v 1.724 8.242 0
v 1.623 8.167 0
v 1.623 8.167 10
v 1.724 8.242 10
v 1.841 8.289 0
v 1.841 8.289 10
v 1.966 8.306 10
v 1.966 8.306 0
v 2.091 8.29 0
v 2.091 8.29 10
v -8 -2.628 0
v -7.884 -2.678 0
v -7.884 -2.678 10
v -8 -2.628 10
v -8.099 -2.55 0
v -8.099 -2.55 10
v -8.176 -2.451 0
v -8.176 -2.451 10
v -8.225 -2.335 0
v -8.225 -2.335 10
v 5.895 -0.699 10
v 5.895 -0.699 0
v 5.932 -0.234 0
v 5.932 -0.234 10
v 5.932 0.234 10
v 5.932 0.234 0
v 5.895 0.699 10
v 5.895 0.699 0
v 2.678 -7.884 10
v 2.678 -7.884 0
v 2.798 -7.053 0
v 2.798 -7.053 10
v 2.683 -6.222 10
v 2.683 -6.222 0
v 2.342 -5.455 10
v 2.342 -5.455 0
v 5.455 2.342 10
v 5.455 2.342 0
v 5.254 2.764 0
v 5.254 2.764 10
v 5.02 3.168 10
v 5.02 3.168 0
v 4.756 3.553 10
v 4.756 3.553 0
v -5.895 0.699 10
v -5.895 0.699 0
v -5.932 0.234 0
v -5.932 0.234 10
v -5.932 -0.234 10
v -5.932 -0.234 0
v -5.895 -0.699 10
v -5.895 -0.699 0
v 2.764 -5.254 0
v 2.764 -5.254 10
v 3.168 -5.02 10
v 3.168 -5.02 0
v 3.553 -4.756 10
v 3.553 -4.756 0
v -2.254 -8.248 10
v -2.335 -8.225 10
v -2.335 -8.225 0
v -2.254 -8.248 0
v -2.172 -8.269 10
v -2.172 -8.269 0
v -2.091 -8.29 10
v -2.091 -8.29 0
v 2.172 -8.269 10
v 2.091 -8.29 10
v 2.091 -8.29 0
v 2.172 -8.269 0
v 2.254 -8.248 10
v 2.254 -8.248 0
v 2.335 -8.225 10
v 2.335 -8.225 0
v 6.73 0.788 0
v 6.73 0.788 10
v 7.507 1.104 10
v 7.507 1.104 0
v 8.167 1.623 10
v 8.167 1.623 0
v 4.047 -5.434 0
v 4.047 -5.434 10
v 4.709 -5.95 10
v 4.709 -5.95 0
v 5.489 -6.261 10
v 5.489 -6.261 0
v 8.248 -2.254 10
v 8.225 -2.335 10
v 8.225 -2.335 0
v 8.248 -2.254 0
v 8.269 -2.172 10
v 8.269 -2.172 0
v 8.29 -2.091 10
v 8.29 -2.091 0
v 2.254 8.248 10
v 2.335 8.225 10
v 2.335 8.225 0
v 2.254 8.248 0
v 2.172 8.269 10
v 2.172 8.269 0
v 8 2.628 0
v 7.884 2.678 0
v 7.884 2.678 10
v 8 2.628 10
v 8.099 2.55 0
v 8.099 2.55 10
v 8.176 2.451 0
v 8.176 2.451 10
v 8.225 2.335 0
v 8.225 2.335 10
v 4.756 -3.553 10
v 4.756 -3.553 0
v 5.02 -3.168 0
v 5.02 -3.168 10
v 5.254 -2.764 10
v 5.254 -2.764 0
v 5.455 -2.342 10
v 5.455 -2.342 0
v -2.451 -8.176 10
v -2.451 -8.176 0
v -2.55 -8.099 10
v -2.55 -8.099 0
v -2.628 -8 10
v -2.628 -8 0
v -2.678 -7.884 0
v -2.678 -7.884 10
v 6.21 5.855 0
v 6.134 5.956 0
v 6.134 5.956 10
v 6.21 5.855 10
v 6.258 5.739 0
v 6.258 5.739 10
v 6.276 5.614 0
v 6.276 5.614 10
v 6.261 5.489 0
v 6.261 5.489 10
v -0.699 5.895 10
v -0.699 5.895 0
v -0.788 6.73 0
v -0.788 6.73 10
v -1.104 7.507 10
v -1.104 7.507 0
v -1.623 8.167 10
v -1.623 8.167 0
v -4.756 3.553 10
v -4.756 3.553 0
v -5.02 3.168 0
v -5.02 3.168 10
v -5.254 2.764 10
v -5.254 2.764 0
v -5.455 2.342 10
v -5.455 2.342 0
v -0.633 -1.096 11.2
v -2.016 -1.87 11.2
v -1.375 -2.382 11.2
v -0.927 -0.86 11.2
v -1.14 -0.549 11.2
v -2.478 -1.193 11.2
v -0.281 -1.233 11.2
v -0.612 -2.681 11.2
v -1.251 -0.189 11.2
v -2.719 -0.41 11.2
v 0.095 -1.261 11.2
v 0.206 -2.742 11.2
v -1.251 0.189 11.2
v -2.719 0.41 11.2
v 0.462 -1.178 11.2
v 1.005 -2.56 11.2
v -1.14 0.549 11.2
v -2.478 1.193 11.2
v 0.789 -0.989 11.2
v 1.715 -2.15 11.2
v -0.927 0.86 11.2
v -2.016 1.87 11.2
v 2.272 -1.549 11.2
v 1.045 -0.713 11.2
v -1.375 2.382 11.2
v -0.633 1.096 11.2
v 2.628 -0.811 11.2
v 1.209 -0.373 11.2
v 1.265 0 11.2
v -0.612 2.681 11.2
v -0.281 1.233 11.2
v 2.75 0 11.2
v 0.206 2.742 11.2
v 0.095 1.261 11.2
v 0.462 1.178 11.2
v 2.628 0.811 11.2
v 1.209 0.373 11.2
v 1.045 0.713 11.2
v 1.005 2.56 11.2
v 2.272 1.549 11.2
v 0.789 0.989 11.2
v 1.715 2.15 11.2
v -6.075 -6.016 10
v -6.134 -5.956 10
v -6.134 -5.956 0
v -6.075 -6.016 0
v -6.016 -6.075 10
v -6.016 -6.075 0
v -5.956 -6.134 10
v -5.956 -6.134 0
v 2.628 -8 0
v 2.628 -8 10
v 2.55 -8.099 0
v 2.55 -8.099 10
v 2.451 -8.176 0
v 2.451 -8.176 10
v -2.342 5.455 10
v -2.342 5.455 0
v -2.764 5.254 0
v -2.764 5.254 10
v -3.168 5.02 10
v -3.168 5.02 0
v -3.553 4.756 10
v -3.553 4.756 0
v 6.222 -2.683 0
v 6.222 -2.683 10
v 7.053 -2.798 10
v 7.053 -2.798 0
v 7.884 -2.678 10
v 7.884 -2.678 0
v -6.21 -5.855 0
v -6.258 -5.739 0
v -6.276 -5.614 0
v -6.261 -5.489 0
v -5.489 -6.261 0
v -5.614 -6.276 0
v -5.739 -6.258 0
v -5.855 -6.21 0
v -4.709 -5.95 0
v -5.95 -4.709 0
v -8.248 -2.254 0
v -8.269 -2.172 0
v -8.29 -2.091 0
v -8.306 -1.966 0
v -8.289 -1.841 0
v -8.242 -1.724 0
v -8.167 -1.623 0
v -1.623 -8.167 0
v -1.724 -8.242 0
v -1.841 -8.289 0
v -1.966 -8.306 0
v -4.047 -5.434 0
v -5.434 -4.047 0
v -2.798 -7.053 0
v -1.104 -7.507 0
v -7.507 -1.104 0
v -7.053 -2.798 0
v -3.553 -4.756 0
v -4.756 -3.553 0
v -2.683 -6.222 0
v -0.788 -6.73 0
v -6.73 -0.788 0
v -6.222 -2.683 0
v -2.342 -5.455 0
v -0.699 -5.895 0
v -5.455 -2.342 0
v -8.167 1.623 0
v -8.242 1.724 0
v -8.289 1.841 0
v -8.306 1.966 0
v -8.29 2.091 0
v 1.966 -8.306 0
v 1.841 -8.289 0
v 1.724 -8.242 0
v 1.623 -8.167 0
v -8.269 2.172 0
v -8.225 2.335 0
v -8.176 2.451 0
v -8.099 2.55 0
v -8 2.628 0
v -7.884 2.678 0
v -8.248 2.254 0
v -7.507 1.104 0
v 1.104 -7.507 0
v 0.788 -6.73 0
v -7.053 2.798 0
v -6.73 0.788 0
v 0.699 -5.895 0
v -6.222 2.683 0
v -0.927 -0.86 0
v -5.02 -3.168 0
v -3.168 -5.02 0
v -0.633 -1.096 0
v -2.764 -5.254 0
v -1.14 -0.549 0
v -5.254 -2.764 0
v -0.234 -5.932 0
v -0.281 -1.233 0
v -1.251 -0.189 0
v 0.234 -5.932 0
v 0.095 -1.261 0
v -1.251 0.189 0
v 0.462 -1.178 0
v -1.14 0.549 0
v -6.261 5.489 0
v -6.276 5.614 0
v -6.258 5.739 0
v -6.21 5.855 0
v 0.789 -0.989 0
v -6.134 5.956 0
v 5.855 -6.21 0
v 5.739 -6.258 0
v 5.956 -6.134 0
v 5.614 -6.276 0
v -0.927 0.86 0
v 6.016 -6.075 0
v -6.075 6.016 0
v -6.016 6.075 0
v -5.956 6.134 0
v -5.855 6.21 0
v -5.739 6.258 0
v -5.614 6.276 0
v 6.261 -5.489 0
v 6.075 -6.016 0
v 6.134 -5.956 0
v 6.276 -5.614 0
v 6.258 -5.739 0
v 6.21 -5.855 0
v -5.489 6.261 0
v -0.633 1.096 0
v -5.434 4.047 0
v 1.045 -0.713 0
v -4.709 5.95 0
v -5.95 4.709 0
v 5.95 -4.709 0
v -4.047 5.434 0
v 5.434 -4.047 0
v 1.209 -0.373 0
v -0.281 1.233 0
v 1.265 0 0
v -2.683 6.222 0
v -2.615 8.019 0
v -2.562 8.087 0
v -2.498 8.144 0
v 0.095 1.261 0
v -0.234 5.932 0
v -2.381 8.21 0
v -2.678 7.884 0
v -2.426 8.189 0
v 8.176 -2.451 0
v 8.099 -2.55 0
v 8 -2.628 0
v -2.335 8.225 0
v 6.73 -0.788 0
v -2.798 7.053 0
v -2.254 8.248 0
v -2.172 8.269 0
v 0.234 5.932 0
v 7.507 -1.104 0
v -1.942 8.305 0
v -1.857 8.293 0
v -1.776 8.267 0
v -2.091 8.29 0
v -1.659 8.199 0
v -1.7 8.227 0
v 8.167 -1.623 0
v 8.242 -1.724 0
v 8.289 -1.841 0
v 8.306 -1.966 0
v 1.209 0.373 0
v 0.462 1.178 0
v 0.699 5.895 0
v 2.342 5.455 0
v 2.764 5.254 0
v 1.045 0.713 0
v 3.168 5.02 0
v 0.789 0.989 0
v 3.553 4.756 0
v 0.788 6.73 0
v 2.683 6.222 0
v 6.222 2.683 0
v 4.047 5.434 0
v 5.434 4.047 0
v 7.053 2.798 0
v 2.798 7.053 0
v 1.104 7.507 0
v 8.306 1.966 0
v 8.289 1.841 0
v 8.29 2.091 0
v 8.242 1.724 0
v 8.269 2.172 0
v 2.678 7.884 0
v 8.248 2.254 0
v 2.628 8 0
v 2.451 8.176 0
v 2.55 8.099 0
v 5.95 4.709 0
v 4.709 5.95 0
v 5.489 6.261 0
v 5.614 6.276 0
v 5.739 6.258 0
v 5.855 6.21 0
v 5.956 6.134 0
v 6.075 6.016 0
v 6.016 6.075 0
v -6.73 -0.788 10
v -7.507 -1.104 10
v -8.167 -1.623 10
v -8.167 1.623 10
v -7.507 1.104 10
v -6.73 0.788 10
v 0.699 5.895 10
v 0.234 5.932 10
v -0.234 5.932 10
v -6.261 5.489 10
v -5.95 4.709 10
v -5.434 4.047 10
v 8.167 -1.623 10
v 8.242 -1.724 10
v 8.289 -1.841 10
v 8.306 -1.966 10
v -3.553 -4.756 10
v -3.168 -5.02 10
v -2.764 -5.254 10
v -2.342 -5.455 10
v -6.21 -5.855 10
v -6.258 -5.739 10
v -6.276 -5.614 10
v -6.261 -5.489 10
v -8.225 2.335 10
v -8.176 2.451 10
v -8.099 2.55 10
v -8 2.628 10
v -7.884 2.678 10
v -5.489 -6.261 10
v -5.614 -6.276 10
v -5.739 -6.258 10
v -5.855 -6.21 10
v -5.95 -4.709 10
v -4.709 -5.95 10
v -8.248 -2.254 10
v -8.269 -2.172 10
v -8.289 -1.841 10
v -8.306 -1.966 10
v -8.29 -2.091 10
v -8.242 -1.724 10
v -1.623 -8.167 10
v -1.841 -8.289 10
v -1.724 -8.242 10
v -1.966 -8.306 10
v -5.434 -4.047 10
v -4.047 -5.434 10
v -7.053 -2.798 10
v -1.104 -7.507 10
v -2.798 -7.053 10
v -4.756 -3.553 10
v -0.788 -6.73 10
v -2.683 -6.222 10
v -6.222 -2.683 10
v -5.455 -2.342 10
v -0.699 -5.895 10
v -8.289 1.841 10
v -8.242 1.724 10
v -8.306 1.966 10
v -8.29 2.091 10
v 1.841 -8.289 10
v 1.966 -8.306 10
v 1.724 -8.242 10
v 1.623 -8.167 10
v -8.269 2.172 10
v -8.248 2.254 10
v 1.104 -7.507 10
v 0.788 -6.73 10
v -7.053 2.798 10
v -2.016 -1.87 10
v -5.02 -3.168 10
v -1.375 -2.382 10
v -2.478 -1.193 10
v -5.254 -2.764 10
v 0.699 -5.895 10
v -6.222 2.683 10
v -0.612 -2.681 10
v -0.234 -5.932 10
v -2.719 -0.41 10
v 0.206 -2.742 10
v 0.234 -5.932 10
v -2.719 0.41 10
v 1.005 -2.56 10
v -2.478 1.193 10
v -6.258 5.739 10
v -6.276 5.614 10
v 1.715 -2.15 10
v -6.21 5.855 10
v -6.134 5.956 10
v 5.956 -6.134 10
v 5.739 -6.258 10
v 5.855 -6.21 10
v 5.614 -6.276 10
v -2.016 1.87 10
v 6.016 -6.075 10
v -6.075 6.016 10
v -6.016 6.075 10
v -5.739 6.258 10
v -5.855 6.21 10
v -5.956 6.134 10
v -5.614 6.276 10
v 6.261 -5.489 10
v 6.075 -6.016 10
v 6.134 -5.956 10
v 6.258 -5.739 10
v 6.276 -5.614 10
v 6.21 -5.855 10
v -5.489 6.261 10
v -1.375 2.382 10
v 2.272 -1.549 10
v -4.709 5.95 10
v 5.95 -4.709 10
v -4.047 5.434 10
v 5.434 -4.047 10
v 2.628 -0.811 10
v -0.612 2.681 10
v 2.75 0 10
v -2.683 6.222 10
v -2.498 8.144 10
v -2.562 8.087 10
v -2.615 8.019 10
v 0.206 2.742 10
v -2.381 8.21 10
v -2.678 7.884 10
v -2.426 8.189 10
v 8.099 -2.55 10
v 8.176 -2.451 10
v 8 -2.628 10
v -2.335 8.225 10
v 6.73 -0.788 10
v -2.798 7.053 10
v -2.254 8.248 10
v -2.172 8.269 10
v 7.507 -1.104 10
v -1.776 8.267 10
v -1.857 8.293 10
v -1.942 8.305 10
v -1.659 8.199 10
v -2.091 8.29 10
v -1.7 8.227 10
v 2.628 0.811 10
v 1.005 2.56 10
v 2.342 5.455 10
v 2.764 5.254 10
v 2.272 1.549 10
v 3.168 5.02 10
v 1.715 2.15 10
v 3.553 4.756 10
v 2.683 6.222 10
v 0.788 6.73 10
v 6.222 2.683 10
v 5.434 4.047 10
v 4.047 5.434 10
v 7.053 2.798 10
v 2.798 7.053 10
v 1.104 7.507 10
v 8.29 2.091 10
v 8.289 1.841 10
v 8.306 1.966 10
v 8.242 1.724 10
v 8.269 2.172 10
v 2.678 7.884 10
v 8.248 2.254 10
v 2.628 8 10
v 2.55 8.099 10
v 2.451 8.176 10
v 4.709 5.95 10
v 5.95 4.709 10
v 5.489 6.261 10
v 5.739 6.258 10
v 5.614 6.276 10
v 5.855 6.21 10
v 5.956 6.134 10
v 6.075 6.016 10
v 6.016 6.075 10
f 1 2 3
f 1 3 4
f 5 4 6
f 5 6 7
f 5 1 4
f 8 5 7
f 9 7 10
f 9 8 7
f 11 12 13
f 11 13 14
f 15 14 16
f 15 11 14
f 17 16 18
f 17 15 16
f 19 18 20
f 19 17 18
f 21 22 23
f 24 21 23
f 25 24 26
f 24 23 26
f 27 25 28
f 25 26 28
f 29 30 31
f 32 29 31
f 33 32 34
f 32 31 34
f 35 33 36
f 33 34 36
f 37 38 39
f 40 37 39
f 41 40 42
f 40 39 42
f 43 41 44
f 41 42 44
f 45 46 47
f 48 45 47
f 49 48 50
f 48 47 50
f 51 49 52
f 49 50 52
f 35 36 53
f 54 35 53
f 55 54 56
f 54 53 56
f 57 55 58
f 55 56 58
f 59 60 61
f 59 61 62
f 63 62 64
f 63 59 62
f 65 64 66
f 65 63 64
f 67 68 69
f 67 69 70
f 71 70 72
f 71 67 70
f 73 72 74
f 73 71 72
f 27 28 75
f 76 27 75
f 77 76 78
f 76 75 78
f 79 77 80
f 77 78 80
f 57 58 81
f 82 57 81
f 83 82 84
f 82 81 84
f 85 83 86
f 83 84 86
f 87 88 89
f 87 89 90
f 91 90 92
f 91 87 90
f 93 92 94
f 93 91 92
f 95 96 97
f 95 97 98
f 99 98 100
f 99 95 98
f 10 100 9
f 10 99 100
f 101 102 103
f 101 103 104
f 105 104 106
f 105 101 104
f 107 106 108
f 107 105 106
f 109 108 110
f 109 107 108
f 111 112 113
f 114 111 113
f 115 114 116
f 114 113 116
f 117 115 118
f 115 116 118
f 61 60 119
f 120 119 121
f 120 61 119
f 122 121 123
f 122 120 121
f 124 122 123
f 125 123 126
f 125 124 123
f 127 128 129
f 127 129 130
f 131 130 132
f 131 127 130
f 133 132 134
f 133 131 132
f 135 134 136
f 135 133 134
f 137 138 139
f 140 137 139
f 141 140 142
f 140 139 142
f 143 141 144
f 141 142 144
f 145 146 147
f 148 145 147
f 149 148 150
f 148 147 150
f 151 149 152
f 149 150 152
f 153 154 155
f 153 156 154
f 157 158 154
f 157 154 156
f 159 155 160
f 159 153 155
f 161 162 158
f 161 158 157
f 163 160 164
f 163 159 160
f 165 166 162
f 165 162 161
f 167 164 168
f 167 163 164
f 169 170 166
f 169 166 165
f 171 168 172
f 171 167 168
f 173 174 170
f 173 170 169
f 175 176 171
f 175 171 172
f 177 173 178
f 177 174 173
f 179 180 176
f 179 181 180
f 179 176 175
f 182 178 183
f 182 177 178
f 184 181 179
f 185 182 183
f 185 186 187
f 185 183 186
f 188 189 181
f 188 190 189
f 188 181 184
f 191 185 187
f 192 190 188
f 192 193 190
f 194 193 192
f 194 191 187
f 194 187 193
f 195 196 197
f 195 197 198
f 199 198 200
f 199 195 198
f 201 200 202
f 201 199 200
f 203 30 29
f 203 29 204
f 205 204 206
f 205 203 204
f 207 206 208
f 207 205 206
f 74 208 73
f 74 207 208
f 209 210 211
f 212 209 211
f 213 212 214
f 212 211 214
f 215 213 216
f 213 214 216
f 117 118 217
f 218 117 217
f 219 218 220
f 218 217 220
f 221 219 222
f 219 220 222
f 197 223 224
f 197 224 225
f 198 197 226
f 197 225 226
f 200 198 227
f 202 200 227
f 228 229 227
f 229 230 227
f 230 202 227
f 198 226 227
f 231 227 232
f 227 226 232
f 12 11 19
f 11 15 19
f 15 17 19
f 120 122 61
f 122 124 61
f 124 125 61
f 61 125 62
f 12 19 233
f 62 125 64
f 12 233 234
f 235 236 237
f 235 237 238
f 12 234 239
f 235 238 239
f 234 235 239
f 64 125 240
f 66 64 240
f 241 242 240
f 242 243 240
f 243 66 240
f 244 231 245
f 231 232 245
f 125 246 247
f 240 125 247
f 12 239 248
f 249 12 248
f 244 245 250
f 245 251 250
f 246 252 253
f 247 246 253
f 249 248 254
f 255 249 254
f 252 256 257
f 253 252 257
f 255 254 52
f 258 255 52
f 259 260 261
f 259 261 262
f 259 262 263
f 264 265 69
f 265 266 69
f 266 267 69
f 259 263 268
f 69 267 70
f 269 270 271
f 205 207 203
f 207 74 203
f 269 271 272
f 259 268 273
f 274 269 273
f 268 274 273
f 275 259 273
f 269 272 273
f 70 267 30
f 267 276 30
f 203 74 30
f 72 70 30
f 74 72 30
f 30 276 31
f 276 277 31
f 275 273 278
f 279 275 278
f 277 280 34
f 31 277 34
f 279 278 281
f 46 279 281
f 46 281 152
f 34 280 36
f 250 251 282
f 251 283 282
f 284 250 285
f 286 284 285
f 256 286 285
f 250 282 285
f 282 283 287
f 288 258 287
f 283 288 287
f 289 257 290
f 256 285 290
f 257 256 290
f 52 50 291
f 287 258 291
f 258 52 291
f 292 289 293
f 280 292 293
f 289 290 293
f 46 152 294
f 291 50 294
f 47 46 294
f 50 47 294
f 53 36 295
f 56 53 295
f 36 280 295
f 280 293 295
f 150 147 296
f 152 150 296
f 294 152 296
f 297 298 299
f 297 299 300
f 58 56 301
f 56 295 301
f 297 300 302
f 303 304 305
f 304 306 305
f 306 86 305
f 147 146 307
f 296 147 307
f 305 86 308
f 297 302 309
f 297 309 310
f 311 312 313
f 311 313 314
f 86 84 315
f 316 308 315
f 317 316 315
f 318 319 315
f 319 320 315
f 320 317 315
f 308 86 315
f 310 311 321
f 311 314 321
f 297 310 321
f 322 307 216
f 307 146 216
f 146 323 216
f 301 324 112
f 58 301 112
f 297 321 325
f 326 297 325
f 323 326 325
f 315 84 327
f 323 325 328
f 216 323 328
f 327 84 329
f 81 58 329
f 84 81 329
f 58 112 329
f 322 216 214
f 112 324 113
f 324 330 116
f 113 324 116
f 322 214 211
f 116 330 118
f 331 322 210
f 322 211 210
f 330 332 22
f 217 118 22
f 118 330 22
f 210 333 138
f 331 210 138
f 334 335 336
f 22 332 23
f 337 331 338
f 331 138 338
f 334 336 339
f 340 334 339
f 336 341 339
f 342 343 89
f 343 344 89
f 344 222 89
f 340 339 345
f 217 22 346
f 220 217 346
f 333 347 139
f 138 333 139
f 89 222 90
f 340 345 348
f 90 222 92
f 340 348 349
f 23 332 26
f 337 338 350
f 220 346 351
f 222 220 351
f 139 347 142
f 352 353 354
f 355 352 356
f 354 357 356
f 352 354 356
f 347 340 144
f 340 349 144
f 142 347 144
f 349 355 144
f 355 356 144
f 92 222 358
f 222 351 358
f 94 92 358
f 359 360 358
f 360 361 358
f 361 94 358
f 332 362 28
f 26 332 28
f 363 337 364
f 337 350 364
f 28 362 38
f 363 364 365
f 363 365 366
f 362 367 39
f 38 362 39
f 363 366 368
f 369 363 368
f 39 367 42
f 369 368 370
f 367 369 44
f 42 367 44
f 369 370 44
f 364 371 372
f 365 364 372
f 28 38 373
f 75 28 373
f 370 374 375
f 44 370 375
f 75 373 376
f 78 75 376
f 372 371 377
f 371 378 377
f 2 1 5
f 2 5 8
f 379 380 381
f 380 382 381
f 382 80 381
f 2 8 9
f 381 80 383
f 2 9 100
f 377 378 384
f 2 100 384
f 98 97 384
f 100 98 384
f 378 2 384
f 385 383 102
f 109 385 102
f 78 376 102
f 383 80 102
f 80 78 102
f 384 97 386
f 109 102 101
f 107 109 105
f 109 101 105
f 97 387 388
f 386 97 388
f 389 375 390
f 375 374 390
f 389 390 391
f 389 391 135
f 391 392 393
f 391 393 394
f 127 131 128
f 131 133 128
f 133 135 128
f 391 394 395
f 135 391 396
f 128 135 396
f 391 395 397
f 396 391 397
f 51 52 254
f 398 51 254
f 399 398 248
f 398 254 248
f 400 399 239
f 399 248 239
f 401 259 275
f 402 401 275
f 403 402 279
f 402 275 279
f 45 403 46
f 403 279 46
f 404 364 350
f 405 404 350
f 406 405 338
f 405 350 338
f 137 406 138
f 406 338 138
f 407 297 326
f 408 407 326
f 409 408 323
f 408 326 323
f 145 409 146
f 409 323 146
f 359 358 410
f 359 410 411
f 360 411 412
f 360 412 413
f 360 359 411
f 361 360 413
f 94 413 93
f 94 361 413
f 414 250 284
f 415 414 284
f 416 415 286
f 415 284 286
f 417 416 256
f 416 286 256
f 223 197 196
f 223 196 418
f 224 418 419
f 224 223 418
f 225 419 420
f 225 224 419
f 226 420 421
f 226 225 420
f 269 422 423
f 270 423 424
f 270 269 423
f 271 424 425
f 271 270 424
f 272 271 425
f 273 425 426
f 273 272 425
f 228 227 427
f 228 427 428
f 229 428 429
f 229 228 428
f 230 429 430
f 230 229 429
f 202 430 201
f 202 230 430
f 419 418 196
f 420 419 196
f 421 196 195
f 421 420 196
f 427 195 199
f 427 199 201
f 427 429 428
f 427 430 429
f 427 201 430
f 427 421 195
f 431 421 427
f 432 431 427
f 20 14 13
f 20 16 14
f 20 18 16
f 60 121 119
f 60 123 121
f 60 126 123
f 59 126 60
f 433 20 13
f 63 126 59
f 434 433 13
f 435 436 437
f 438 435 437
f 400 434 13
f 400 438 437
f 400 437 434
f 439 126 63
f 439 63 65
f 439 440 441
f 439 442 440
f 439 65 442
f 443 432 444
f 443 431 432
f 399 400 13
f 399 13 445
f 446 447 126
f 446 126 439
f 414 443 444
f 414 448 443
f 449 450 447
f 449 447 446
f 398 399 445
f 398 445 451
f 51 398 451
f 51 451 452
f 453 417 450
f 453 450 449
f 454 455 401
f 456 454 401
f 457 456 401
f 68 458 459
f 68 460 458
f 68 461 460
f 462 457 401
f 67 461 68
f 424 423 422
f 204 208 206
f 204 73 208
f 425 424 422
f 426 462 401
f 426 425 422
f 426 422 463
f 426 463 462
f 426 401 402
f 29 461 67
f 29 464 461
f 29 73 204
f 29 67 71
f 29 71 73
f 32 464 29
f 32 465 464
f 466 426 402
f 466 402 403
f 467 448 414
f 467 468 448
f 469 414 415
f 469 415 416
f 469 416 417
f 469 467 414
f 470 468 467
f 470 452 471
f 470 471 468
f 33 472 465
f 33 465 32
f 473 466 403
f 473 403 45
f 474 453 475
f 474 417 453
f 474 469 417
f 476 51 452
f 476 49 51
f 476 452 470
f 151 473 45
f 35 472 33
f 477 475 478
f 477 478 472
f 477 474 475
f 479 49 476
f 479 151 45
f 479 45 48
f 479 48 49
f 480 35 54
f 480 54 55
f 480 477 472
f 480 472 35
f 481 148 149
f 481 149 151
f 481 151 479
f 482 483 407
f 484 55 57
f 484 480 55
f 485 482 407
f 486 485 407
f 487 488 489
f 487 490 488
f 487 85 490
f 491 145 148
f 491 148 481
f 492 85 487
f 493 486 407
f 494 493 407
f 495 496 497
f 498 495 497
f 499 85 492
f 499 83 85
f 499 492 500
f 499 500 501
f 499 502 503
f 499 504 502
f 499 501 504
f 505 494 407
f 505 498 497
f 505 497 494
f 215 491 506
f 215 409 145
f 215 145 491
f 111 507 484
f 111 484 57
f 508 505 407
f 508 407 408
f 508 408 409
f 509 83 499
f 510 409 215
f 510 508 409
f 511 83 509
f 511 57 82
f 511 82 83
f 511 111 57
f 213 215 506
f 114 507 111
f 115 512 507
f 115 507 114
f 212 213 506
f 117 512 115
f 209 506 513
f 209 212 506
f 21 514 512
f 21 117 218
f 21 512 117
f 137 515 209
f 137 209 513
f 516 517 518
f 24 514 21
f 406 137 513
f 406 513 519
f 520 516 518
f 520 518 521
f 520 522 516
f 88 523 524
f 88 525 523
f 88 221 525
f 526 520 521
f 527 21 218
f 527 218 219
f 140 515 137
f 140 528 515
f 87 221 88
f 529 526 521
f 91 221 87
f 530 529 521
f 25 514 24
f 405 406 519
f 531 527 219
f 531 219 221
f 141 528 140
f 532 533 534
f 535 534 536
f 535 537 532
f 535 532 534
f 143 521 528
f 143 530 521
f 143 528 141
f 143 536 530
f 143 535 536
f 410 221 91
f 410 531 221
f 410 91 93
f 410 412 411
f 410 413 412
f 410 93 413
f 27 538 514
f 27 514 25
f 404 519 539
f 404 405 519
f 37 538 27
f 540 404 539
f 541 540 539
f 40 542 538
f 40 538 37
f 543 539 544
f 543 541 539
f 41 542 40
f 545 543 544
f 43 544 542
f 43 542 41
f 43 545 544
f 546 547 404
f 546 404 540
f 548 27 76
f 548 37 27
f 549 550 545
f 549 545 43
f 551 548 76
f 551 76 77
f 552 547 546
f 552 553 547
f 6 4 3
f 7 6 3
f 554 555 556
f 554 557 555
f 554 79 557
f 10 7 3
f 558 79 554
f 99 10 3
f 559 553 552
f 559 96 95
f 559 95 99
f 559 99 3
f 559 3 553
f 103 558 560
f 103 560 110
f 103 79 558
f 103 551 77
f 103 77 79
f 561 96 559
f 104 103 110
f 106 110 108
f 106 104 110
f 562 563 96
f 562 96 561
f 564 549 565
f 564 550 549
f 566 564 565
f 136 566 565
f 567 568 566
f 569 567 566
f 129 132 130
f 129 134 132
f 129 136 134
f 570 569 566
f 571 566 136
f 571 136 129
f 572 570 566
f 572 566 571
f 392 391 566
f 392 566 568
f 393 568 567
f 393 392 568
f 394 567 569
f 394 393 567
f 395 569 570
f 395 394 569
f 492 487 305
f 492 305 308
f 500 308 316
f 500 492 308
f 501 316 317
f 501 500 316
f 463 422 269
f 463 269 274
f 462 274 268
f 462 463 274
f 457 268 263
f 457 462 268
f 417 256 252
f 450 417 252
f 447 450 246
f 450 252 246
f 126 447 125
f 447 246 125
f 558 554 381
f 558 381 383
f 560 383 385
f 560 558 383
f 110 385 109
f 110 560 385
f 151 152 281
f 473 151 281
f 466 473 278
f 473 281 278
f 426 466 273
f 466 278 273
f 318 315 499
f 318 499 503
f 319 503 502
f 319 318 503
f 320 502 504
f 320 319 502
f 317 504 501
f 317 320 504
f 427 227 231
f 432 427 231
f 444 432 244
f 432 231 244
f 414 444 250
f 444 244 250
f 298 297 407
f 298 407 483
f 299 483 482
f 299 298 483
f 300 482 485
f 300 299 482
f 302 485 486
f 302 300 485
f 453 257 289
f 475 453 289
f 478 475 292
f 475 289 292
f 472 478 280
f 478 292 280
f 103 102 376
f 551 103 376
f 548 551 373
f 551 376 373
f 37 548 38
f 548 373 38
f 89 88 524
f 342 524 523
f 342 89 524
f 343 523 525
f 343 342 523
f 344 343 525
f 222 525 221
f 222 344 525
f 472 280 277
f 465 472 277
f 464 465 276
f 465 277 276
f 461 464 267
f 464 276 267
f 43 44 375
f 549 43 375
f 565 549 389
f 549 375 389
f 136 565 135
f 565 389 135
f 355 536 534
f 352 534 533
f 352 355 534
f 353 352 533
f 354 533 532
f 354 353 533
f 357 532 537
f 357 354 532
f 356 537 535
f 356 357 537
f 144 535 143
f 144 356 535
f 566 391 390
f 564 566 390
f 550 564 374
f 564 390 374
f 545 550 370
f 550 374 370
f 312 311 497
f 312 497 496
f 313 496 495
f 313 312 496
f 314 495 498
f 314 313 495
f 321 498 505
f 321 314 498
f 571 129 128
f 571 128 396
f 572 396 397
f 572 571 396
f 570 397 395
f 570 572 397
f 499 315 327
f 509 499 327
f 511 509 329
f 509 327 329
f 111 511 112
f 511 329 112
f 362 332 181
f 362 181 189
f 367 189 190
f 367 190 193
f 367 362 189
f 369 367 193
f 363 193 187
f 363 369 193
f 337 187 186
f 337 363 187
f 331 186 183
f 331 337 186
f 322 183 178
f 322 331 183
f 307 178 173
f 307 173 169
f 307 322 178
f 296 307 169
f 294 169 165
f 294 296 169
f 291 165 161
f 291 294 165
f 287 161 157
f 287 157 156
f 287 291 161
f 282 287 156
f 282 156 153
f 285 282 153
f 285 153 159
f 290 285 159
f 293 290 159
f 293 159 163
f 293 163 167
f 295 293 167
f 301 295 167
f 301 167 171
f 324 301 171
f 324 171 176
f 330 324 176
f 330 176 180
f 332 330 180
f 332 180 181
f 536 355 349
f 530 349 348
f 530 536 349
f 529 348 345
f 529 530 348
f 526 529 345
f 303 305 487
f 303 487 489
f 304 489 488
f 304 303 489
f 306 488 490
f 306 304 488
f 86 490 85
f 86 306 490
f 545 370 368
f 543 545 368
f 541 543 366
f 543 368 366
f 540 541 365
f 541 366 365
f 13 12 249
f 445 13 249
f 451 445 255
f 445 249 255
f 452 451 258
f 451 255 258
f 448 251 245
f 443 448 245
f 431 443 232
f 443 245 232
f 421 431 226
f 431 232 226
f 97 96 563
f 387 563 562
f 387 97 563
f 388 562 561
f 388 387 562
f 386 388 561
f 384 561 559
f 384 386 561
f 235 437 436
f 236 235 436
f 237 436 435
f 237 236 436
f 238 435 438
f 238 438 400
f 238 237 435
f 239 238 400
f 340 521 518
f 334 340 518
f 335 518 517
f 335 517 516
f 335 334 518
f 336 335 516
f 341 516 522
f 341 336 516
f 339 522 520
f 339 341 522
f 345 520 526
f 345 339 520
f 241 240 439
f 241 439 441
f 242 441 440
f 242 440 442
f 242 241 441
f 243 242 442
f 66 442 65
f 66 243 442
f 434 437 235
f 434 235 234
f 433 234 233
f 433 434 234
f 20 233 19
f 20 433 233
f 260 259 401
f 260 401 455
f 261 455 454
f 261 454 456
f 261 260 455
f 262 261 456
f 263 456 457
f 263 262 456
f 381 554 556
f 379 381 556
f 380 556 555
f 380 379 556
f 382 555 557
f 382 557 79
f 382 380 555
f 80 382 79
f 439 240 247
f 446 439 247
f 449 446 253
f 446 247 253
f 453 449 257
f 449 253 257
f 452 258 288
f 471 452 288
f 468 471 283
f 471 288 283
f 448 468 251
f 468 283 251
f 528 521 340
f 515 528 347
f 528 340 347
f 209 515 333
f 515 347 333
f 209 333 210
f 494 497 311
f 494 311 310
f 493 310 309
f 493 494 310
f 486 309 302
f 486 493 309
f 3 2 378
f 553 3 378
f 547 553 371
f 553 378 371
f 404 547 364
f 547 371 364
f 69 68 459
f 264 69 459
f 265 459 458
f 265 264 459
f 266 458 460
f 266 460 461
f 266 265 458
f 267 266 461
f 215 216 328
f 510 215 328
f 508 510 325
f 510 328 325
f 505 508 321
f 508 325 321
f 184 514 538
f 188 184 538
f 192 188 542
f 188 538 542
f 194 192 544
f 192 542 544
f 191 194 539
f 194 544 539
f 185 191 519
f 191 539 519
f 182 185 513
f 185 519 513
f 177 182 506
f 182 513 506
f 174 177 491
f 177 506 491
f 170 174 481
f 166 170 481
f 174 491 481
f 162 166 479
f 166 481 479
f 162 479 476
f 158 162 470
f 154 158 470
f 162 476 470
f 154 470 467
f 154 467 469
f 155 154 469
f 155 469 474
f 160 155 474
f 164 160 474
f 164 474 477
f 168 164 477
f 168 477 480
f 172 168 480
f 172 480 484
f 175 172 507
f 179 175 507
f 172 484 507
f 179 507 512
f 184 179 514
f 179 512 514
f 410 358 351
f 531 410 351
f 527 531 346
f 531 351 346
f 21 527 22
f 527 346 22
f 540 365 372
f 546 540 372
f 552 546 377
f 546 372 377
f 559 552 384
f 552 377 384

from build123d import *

# Parameters (mm, degrees)
SKETCH_1_R               = 1.265
EXTRUDE_1_DEPTH          = 10
SKETCH_2_R               = 2.75
SKETCH_2_R_2             = 1.265
EXTRUDE_2_DEPTH          = 1.2
SKETCH_3_R               = 10.210079725
SKETCH_3_R_2             = 7.3
CUT_EXTRUDE_2_DEPTH      = 16.316956182
FILLET_1_R               = 0.5
PATTERN_CIRCULAR_2_DEPTH = 10
CUT_EXTRUDE_START        = -10
SKETCH_5_R               = 9.117609572
SKETCH_5_R_2             = 4.6865
CUT_EXTRUDE_3_DEPTH      = 10
EXTRUDE_START            = -10
SKETCH_4_R               = 1.265
EXTRUDE_3_DEPTH          = 10
SKETCH_6_R               = 15.550265039
SKETCH_6_R_2             = 8.55
CUT_EXTRUDE_4_DEPTH      = 10
FILLET_2_R               = 0.5
PATTERN_CIRCULAR_4_DEPTH = 10


# Read off the part's stored shape, not the designer's step: Круговой массив2, Круговой массив4
with BuildPart() as part:
    # Эскиз1 → Бобышка-Вытянуть1 (new body)
    with BuildSketch(Plane.XY):
        with BuildLine():
            ThreePointArc((-3.148803906, 3.471068454), (-4.227852242, 4.566214035), (-5.743712894, 4.822837566))
            ThreePointArc((-5.743712894, 4.822837566), (-5.841480421, 4.703945843), (-5.936787387, 4.583072716))
            ThreePointArc((-5.936787387, 4.583072716), (-5.362797198, 3.156810321), (-4.062728379, 2.336133637))
            ThreePointArc((-4.062728379, 2.336133637), (-4.379801209, 1.667520202), (-4.587678719, 0.95733287))
            ThreePointArc((-4.587678719, 0.95733287), (-6.104357582, 1.209075557), (-7.481554138, 0.525687819))
            ThreePointArc((-7.481554138, 0.525687819), (-7.490766927, 0.372036085), (-7.496824441, 0.218227641))
            ThreePointArc((-7.496824441, 0.218227641), (-6.194120622, -0.598259906), (-4.659961201, -0.498040012))
            ThreePointArc((-4.659961201, -0.498040012), (-4.523477392, -1.225330377), (-4.274216191, -1.922071332))
            ThreePointArc((-4.274216191, -1.922071332), (-5.649205805, -2.609888688), (-6.361695989, -3.972256807))
            ThreePointArc((-6.361695989, -3.972256807), (-6.278835069, -4.101978813), (-6.193329365, -4.229972975))
            ThreePointArc((-6.193329365, -4.229972975), (-4.659500498, -4.124815183), (-3.477247231, -3.141979304))
            ThreePointArc((-3.477247231, -3.141979304), (-2.939338959, -3.650146399), (-2.328148353, -4.067309614))
            ThreePointArc((-2.328148353, -4.067309614), (-3.03624942, -5.431964161), (-2.811886199, -6.952934345))
            ThreePointArc((-2.811886199, -6.952934345), (-2.668601624, -7.009177225), (-2.524192976, -7.062467686))
            ThreePointArc((-2.524192976, -7.062467686), (-1.345109555, -6.075831258), (-0.966343005, -4.585789294))
            ThreePointArc((-0.966343005, -4.585789294), (-0.232472948, -4.68073056), (0.507193024, -4.658973866))
            ThreePointArc((0.507193024, -4.658973866), (0.736451045, -6.179213951), (1.811968547, -7.277827285))
            ThreePointArc((1.811968547, -7.277827285), (1.960946938, -7.239108171), (2.109099336, -7.197339786))
            ThreePointArc((2.109099336, -7.197339786), (2.483067519, -5.706086302), (1.913671403, -4.277983638))
            ThreePointArc((1.913671403, -4.277983638), (2.563189827, -3.92343474), (3.148803906, -3.471068454))
            ThreePointArc((3.148803906, -3.471068454), (4.227852242, -4.566214035), (5.743712894, -4.822837566))
            ThreePointArc((5.743712894, -4.822837566), (5.841480421, -4.703945843), (5.936787387, -4.583072716))
            ThreePointArc((5.936787387, -4.583072716), (5.362797198, -3.156810321), (4.062728379, -2.336133637))
            ThreePointArc((4.062728379, -2.336133637), (4.379801209, -1.667520202), (4.587678719, -0.95733287))
            ThreePointArc((4.587678719, -0.95733287), (6.104357582, -1.209075557), (7.481554138, -0.525687819))
            ThreePointArc((7.481554138, -0.525687819), (7.490766927, -0.372036085), (7.496824441, -0.218227641))
            ThreePointArc((7.496824441, -0.218227641), (6.194120622, 0.598259906), (4.659961201, 0.498040012))
            ThreePointArc((4.659961201, 0.498040012), (4.523477392, 1.225330377), (4.274216191, 1.922071332))
            ThreePointArc((4.274216191, 1.922071332), (5.649205805, 2.609888688), (6.361695989, 3.972256807))
            ThreePointArc((6.361695989, 3.972256807), (6.278835069, 4.101978813), (6.193329365, 4.229972975))
            ThreePointArc((6.193329365, 4.229972975), (4.659500498, 4.124815183), (3.477247231, 3.141979304))
            ThreePointArc((3.477247231, 3.141979304), (2.939338959, 3.650146399), (2.328148353, 4.067309614))
            ThreePointArc((2.328148353, 4.067309614), (3.03624942, 5.431964161), (2.811886199, 6.952934345))
            ThreePointArc((2.811886199, 6.952934345), (2.668601624, 7.009177225), (2.524192976, 7.062467686))
            ThreePointArc((2.524192976, 7.062467686), (1.345109555, 6.075831258), (0.966343005, 4.585789294))
            ThreePointArc((0.966343005, 4.585789294), (0.232472948, 4.68073056), (-0.507193024, 4.658973866))
            ThreePointArc((-0.507193024, 4.658973866), (-0.736451045, 6.179213951), (-1.811968547, 7.277827285))
            ThreePointArc((-1.811968547, 7.277827285), (-1.960946938, 7.239108171), (-2.109099336, 7.197339786))
            ThreePointArc((-2.109099336, 7.197339786), (-2.483067519, 5.706086302), (-1.913671403, 4.277983638))
            ThreePointArc((-1.913671403, 4.277983638), (-2.563189827, 3.92343474), (-3.148803906, 3.471068454))
        make_face()
        Circle(SKETCH_1_R, mode=Mode.SUBTRACT)
    extrude(amount=EXTRUDE_1_DEPTH)

    # Эскиз2 → Бобышка-Вытянуть2 (add)
    with BuildSketch(Plane.XY.offset(10)):
        Circle(SKETCH_2_R)
        Circle(SKETCH_2_R_2, mode=Mode.SUBTRACT)
    extrude(amount=EXTRUDE_2_DEPTH)

    # Эскиз3 → Вырез-Вытянуть2 (cut, through all)
    with BuildSketch(Plane(origin=(0, 0, 0), x_dir=(-1, 0, 0), z_dir=(0, 0, -1))):
        Circle(SKETCH_3_R)
        Circle(SKETCH_3_R_2, mode=Mode.SUBTRACT)
    extrude(amount=-CUT_EXTRUDE_2_DEPTH, mode=Mode.SUBTRACT)

    # Скругление1
    fillet_1_edges = [part.edges().sort_by_distance(p)[0] for p in [
        (-2.246892365, 6.945608303, 5),
        (-1.565958675, 7.13006125, 5),
    ]]
    fillet(fillet_1_edges, radius=FILLET_1_R)

    # Круговой массив2 outline → Круговой массив2 (cut)
    with BuildSketch(Plane.XY):
        with BuildLine():
            ThreePointArc((-5.838293306, 4.042408612), (-5.850561559, 4.278183981), (-5.753278974, 4.493304024))
            ThreePointArc((-5.753278974, 4.493304024), (-5.827604273, 4.396479095), (-5.900300237, 4.298424958))
            ThreePointArc((-5.900300237, 4.298424958), (-5.872671085, 4.169599529), (-5.838293306, 4.042408612))
        make_face()
        with BuildLine():
            ThreePointArc((-5.457832031, 4.847893307), (-5.538127486, 4.755958783), (-5.61687454, 4.662694543))
            ThreePointArc((-5.61687454, 4.662694543), (-5.427449488, 4.803615386), (-5.19448163, 4.841910441))
            ThreePointArc((-5.19448163, 4.841910441), (-5.326077976, 4.84837285), (-5.457832031, 4.847893307))
        make_face()
        with BuildLine():
            ThreePointArc((-7.099346669, -0.161285439), (-7.247857179, 0.022249743), (-7.295598302, 0.253466783))
            ThreePointArc((-7.295598302, 0.253466783), (-7.298816468, 0.131446456), (-7.299993962, 0.009389377))
            ThreePointArc((-7.299993962, 0.009389377), (-7.201919821, -0.078592576), (-7.099346669, -0.161285439))
        make_face()
        with BuildLine():
            ThreePointArc((-7.264999056, 0.713994895), (-7.275921686, 0.592421818), (-7.284810046, 0.470683106))
            ThreePointArc((-7.284810046, 0.470683106), (-7.214393154, 0.696031715), (-7.048427465, 0.863948137))
            ThreePointArc((-7.048427465, 0.863948137), (-7.158689654, 0.791825944), (-7.264999056, 0.713994895))
        make_face()
        with BuildLine():
            ThreePointArc((-5.648690902, -4.303373934), (-5.876717701, -4.24218314), (-6.051247048, -4.083186154))
            ThreePointArc((-6.051247048, -4.083186154), (-5.982128849, -4.183794263), (-5.911338111, -4.283232627))
            ThreePointArc((-5.911338111, -4.283232627), (-5.78027997, -4.296764989), (-5.648690902, -4.303373934))
        make_face()
        with BuildLine():
            ThreePointArc((-6.29718337, -3.692625299), (-6.234561102, -3.797400146), (-6.170195716, -3.90111328))
            ThreePointArc((-6.170195716, -3.90111328), (-6.245683843, -3.677412414), (-6.210113576, -3.444012991))
            ThreePointArc((-6.210113576, -3.444012991), (-6.2569252, -3.567171559), (-6.29718337, -3.692625299))
        make_face()
        with BuildLine():
            ThreePointArc((-2.040427202, -6.801719852), (-2.260871804, -6.88624625), (-2.495525095, -6.860200762))
            ThreePointArc((-2.495525095, -6.860200762), (-2.380471335, -6.900967774), (-2.264752021, -6.939805349))
            ThreePointArc((-2.264752021, -6.939805349), (-2.150769635, -6.873719217), (-2.040427202, -6.801719852))
        make_face()
        with BuildLine():
            ThreePointArc((-2.92405767, -6.688788137), (-2.811810081, -6.736744322), (-2.69877634, -6.782816986))
            ThreePointArc((-2.69877634, -6.782816986), (-2.891335587, -6.646209992), (-2.999747375, -6.436478214))
            ThreePointArc((-2.999747375, -6.436478214), (-2.965227985, -6.563630771), (-2.92405767, -6.688788137))
        make_face()
        with BuildLine():
            ThreePointArc((2.347210337, -6.702039969), (2.218550278, -6.899997348), (2.013402624, -7.016851849))
            ThreePointArc((2.013402624, -7.016851849), (2.130445319, -6.982206151), (2.246892365, -6.945608303))
            ThreePointArc((2.246892365, -6.945608303), (2.300261598, -6.825146334), (2.347210337, -6.702039969))
        make_face()
        with BuildLine():
            ThreePointArc((1.565958675, -7.13006125), (1.684956821, -7.102881142), (1.80348387, -7.073715143))
            ThreePointArc((1.80348387, -7.073715143), (1.56740459, -7.076381249), (1.356420365, -6.970427527))
            ThreePointArc((1.356420365, -6.970427527), (1.459085537, -7.053006118), (1.565958675, -7.13006125))
        make_face()
        with BuildLine():
            ThreePointArc((5.838293306, -4.042408612), (5.850561559, -4.278183981), (5.753278974, -4.493304024))
            ThreePointArc((5.753278974, -4.493304024), (5.827604273, -4.396479095), (5.900300237, -4.298424958))
            ThreePointArc((5.900300237, -4.298424958), (5.872671085, -4.169599529), (5.838293306, -4.042408612))
        make_face()
        with BuildLine():
            ThreePointArc((5.457832031, -4.847893307), (5.538127486, -4.755958783), (5.61687454, -4.662694543))
            ThreePointArc((5.61687454, -4.662694543), (5.427449488, -4.803615386), (5.19448163, -4.841910441))
            ThreePointArc((5.19448163, -4.841910441), (5.326077976, -4.84837285), (5.457832031, -4.847893307))
        make_face()
        with BuildLine():
            ThreePointArc((7.099346669, 0.161285439), (7.247857179, -0.022249743), (7.295598302, -0.253466783))
            ThreePointArc((7.295598302, -0.253466783), (7.298816468, -0.131446456), (7.299993962, -0.009389377))
            ThreePointArc((7.299993962, -0.009389377), (7.201919821, 0.078592576), (7.099346669, 0.161285439))
        make_face()
        with BuildLine():
            ThreePointArc((7.264999056, -0.713994895), (7.275921686, -0.592421818), (7.284810046, -0.470683106))
            ThreePointArc((7.284810046, -0.470683106), (7.214393154, -0.696031715), (7.048427465, -0.863948137))
            ThreePointArc((7.048427465, -0.863948137), (7.158689654, -0.791825944), (7.264999056, -0.713994895))
        make_face()
        with BuildLine():
            ThreePointArc((5.648690902, 4.303373934), (5.876717701, 4.24218314), (6.051247048, 4.083186154))
            ThreePointArc((6.051247048, 4.083186154), (5.982128849, 4.183794263), (5.911338111, 4.283232627))
            ThreePointArc((5.911338111, 4.283232627), (5.78027997, 4.296764989), (5.648690902, 4.303373934))
        make_face()
        with BuildLine():
            ThreePointArc((6.29718337, 3.692625299), (6.234561102, 3.797400146), (6.170195716, 3.90111328))
            ThreePointArc((6.170195716, 3.90111328), (6.245683843, 3.677412414), (6.210113576, 3.444012991))
            ThreePointArc((6.210113576, 3.444012991), (6.2569252, 3.567171559), (6.29718337, 3.692625299))
        make_face()
        with BuildLine():
            ThreePointArc((2.040427202, 6.801719852), (2.260871804, 6.88624625), (2.495525095, 6.860200762))
            ThreePointArc((2.495525095, 6.860200762), (2.380471335, 6.900967774), (2.264752021, 6.939805349))
            ThreePointArc((2.264752021, 6.939805349), (2.150769635, 6.873719217), (2.040427202, 6.801719852))
        make_face()
        with BuildLine():
            ThreePointArc((2.92405767, 6.688788137), (2.811810081, 6.736744322), (2.69877634, 6.782816986))
            ThreePointArc((2.69877634, 6.782816986), (2.891335587, 6.646209992), (2.999747375, 6.436478214))
            ThreePointArc((2.999747375, 6.436478214), (2.965227985, 6.563630771), (2.92405767, 6.688788137))
        make_face()
    extrude(amount=PATTERN_CIRCULAR_2_DEPTH, mode=Mode.SUBTRACT)

    # Эскиз5 → Вырез-Вытянуть3 (cut)
    with BuildSketch(Plane.XY.offset(10).offset(CUT_EXTRUDE_START)):
        Circle(SKETCH_5_R)
        Circle(SKETCH_5_R_2, mode=Mode.SUBTRACT)
    extrude(amount=CUT_EXTRUDE_3_DEPTH, mode=Mode.SUBTRACT)

    # Эскиз4 → Бобышка-Вытянуть3 (add)
    with BuildSketch(Plane.XY.offset(10).offset(EXTRUDE_START)):
        with BuildLine():
            ThreePointArc((4.755723654, 3.55318516), (5.872933327, 4.582980438), (6.342289434, 6.028089642))
            ThreePointArc((6.342289434, 6.028089642), (6.187184335, 6.187184335), (6.028089642, 6.342289434))
            ThreePointArc((6.028089642, 6.342289434), (4.582980438, 5.872933327), (3.55318516, 4.755723654))
            ThreePointArc((3.55318516, 4.755723654), (2.96825, 5.14115981), (2.341984918, 5.45501044))
            ThreePointArc((2.341984918, 5.45501044), (2.794619237, 6.905444148), (2.478538947, 8.391623483))
            ThreePointArc((2.478538947, 8.391623483), (2.264666645, 8.45185098), (2.049334049, 8.506628589))
            ThreePointArc((2.049334049, 8.506628589), (1.03251082, 7.377599675), (0.699286786, 5.895170077))
            ThreePointArc((0.699286786, 5.895170077), (0, 5.9365), (-0.699286786, 5.895170077))
            ThreePointArc((-0.699286786, 5.895170077), (-1.03251082, 7.377599675), (-2.049334049, 8.506628589))
            ThreePointArc((-2.049334049, 8.506628589), (-2.264666645, 8.45185098), (-2.478538947, 8.391623483))
            ThreePointArc((-2.478538947, 8.391623483), (-2.794619237, 6.905444148), (-2.341984918, 5.45501044))
            ThreePointArc((-2.341984918, 5.45501044), (-2.96825, 5.14115981), (-3.55318516, 4.755723654))
            ThreePointArc((-3.55318516, 4.755723654), (-4.582980438, 5.872933327), (-6.028089642, 6.342289434))
            ThreePointArc((-6.028089642, 6.342289434), (-6.187184335, 6.187184335), (-6.342289434, 6.028089642))
            ThreePointArc((-6.342289434, 6.028089642), (-5.872933327, 4.582980438), (-4.755723654, 3.55318516))
            ThreePointArc((-4.755723654, 3.55318516), (-5.14115981, 2.96825), (-5.45501044, 2.341984918))
            ThreePointArc((-5.45501044, 2.341984918), (-6.905444148, 2.794619237), (-8.391623483, 2.478538947))
            ThreePointArc((-8.391623483, 2.478538947), (-8.45185098, 2.264666645), (-8.506628589, 2.049334049))
            ThreePointArc((-8.506628589, 2.049334049), (-7.377599675, 1.03251082), (-5.895170077, 0.699286786))
            ThreePointArc((-5.895170077, 0.699286786), (-5.9365, 0), (-5.895170077, -0.699286786))
            ThreePointArc((-5.895170077, -0.699286786), (-7.377599675, -1.03251082), (-8.506628589, -2.049334049))
            ThreePointArc((-8.506628589, -2.049334049), (-8.45185098, -2.264666645), (-8.391623483, -2.478538947))
            ThreePointArc((-8.391623483, -2.478538947), (-6.905444148, -2.794619237), (-5.45501044, -2.341984918))
            ThreePointArc((-5.45501044, -2.341984918), (-5.14115981, -2.96825), (-4.755723654, -3.55318516))
            ThreePointArc((-4.755723654, -3.55318516), (-5.872933327, -4.582980438), (-6.342289434, -6.028089642))
            ThreePointArc((-6.342289434, -6.028089642), (-6.187184335, -6.187184335), (-6.028089642, -6.342289434))
            ThreePointArc((-6.028089642, -6.342289434), (-4.582980438, -5.872933327), (-3.55318516, -4.755723654))
            ThreePointArc((-3.55318516, -4.755723654), (-2.96825, -5.14115981), (-2.341984918, -5.45501044))
            ThreePointArc((-2.341984918, -5.45501044), (-2.794619237, -6.905444148), (-2.478538947, -8.391623483))
            ThreePointArc((-2.478538947, -8.391623483), (-2.264666645, -8.45185098), (-2.049334049, -8.506628589))
            ThreePointArc((-2.049334049, -8.506628589), (-1.03251082, -7.377599675), (-0.699286786, -5.895170077))
            ThreePointArc((-0.699286786, -5.895170077), (0, -5.9365), (0.699286786, -5.895170077))
            ThreePointArc((0.699286786, -5.895170077), (1.03251082, -7.377599675), (2.049334049, -8.506628589))
            ThreePointArc((2.049334049, -8.506628589), (2.264666645, -8.45185098), (2.478538947, -8.391623483))
            ThreePointArc((2.478538947, -8.391623483), (2.794619237, -6.905444148), (2.341984918, -5.45501044))
            ThreePointArc((2.341984918, -5.45501044), (2.96825, -5.14115981), (3.55318516, -4.755723654))
            ThreePointArc((3.55318516, -4.755723654), (4.582980438, -5.872933327), (6.028089642, -6.342289434))
            ThreePointArc((6.028089642, -6.342289434), (6.187184335, -6.187184335), (6.342289434, -6.028089642))
            ThreePointArc((6.342289434, -6.028089642), (5.872933327, -4.582980438), (4.755723654, -3.55318516))
            ThreePointArc((4.755723654, -3.55318516), (5.14115981, -2.96825), (5.45501044, -2.341984918))
            ThreePointArc((5.45501044, -2.341984918), (6.905444148, -2.794619237), (8.391623483, -2.478538947))
            ThreePointArc((8.391623483, -2.478538947), (8.45185098, -2.264666645), (8.506628589, -2.049334049))
            ThreePointArc((8.506628589, -2.049334049), (7.377599675, -1.03251082), (5.895170077, -0.699286786))
            ThreePointArc((5.895170077, -0.699286786), (5.9365, 0), (5.895170077, 0.699286786))
            ThreePointArc((5.895170077, 0.699286786), (7.377599675, 1.03251082), (8.506628589, 2.049334049))
            ThreePointArc((8.506628589, 2.049334049), (8.45185098, 2.264666645), (8.391623483, 2.478538947))
            ThreePointArc((8.391623483, 2.478538947), (6.905444148, 2.794619237), (5.45501044, 2.341984918))
            ThreePointArc((5.45501044, 2.341984918), (5.14115981, 2.96825), (4.755723654, 3.55318516))
        make_face()
        Circle(SKETCH_4_R, mode=Mode.SUBTRACT)
    extrude(amount=EXTRUDE_3_DEPTH)

    # Эскиз6 → Вырез-Вытянуть4 (cut)
    with BuildSketch(Plane.XY.offset(10)):
        Circle(SKETCH_6_R)
        Circle(SKETCH_6_R_2, mode=Mode.SUBTRACT)
    extrude(amount=-CUT_EXTRUDE_4_DEPTH, mode=Mode.SUBTRACT)

    # Скругление2
    fillet_2_edges = [part.edges().sort_by_distance(p)[0] for p in [
        (-1.834015536, 8.350981201, 5),
        (-2.587186555, 8.149169634, 5),
    ]]
    fillet(fillet_2_edges, radius=FILLET_2_R)

    # Круговой массив4 outline → Круговой массив4 (cut)
    with BuildSketch(Plane.XY):
        with BuildLine():
            ThreePointArc((5.763794646, 6.315154098), (5.625595497, 6.291434191), (5.48865567, 6.261282532))
            ThreePointArc((5.48865567, 6.261282532), (5.738638085, 6.258135911), (5.955848779, 6.134359406))
            ThreePointArc((5.955848779, 6.134359406), (5.860518934, 6.225497395), (5.763794646, 6.315154098))
        make_face()
        with BuildLine():
            ThreePointArc((6.315154098, 5.763794646), (6.225497395, 5.860518934), (6.134359406, 5.955848779))
            ThreePointArc((6.134359406, 5.955848779), (6.258135911, 5.738638085), (6.261282532, 5.48865567))
            ThreePointArc((6.261282532, 5.48865567), (6.291434191, 5.625595497), (6.315154098, 5.763794646))
        make_face()
        with BuildLine():
            ThreePointArc((1.834015536, 8.350981201), (1.726191515, 8.261339585), (1.622673976, 8.166757568))
            ThreePointArc((1.622673976, 8.166757568), (1.840738409, 8.289023721), (2.090736641, 8.290435471))
            ThreePointArc((2.090736641, 8.290435471), (1.962609579, 8.321698363), (1.834015536, 8.350981201))
        make_face()
        with BuildLine():
            ThreePointArc((2.587186555, 8.149169634), (2.461179428, 8.188106974), (2.334586692, 8.225096047))
            ThreePointArc((2.334586692, 8.225096047), (2.550385637, 8.09887432), (2.678101898, 7.883956508))
            ThreePointArc((2.678101898, 7.883956508), (2.635744088, 8.017625707), (2.587186555, 8.149169634))
        make_face()
        with BuildLine():
            ThreePointArc((-6.315154098, 5.763794646), (-6.291434191, 5.625595497), (-6.261282532, 5.48865567))
            ThreePointArc((-6.261282532, 5.48865567), (-6.258135911, 5.738638085), (-6.134359406, 5.955848779))
            ThreePointArc((-6.134359406, 5.955848779), (-6.225497395, 5.860518934), (-6.315154098, 5.763794646))
        make_face()
        with BuildLine():
            ThreePointArc((-5.763794646, 6.315154098), (-5.860518934, 6.225497395), (-5.955848779, 6.134359406))
            ThreePointArc((-5.955848779, 6.134359406), (-5.738638085, 6.258135911), (-5.48865567, 6.261282532))
            ThreePointArc((-5.48865567, 6.261282532), (-5.625595497, 6.291434191), (-5.763794646, 6.315154098))
        make_face()
        with BuildLine():
            ThreePointArc((-8.350981201, 1.834015536), (-8.261339585, 1.726191515), (-8.166757568, 1.622673976))
            ThreePointArc((-8.166757568, 1.622673976), (-8.289023721, 1.840738409), (-8.290435471, 2.090736641))
            ThreePointArc((-8.290435471, 2.090736641), (-8.321698363, 1.962609579), (-8.350981201, 1.834015536))
        make_face()
        with BuildLine():
            ThreePointArc((-8.149169634, 2.587186555), (-8.188106974, 2.461179428), (-8.225096047, 2.334586692))
            ThreePointArc((-8.225096047, 2.334586692), (-8.09887432, 2.550385637), (-7.883956508, 2.678101898))
            ThreePointArc((-7.883956508, 2.678101898), (-8.017625707, 2.635744088), (-8.149169634, 2.587186555))
        make_face()
        with BuildLine():
            ThreePointArc((-8.149169634, -2.587186555), (-8.017625707, -2.635744088), (-7.883956508, -2.678101898))
            ThreePointArc((-7.883956508, -2.678101898), (-8.09887432, -2.550385637), (-8.225096047, -2.334586692))
            ThreePointArc((-8.225096047, -2.334586692), (-8.188106974, -2.461179428), (-8.149169634, -2.587186555))
        make_face()
        with BuildLine():
            ThreePointArc((-8.350981201, -1.834015536), (-8.321698363, -1.962609579), (-8.290435471, -2.090736641))
            ThreePointArc((-8.290435471, -2.090736641), (-8.289023721, -1.840738409), (-8.166757568, -1.622673976))
            ThreePointArc((-8.166757568, -1.622673976), (-8.261339585, -1.726191515), (-8.350981201, -1.834015536))
        make_face()
        with BuildLine():
            ThreePointArc((-5.763794646, -6.315154098), (-5.625595497, -6.291434191), (-5.48865567, -6.261282532))
            ThreePointArc((-5.48865567, -6.261282532), (-5.738638085, -6.258135911), (-5.955848779, -6.134359406))
            ThreePointArc((-5.955848779, -6.134359406), (-5.860518934, -6.225497395), (-5.763794646, -6.315154098))
        make_face()
        with BuildLine():
            ThreePointArc((-6.315154098, -5.763794646), (-6.225497395, -5.860518934), (-6.134359406, -5.955848779))
            ThreePointArc((-6.134359406, -5.955848779), (-6.258135911, -5.738638085), (-6.261282532, -5.48865567))
            ThreePointArc((-6.261282532, -5.48865567), (-6.291434191, -5.625595497), (-6.315154098, -5.763794646))
        make_face()
        with BuildLine():
            ThreePointArc((-1.834015536, -8.350981201), (-1.726191515, -8.261339585), (-1.622673976, -8.166757568))
            ThreePointArc((-1.622673976, -8.166757568), (-1.840738409, -8.289023721), (-2.090736641, -8.290435471))
            ThreePointArc((-2.090736641, -8.290435471), (-1.962609579, -8.321698363), (-1.834015536, -8.350981201))
        make_face()
        with BuildLine():
            ThreePointArc((-2.587186555, -8.149169634), (-2.461179428, -8.188106974), (-2.334586692, -8.225096047))
            ThreePointArc((-2.334586692, -8.225096047), (-2.550385637, -8.09887432), (-2.678101898, -7.883956508))
            ThreePointArc((-2.678101898, -7.883956508), (-2.635744088, -8.017625707), (-2.587186555, -8.149169634))
        make_face()
        with BuildLine():
            ThreePointArc((2.587186555, -8.149169634), (2.635744088, -8.017625707), (2.678101898, -7.883956508))
            ThreePointArc((2.678101898, -7.883956508), (2.550385637, -8.09887432), (2.334586692, -8.225096047))
            ThreePointArc((2.334586692, -8.225096047), (2.461179428, -8.188106974), (2.587186555, -8.149169634))
        make_face()
        with BuildLine():
            ThreePointArc((1.834015536, -8.350981201), (1.962609579, -8.321698363), (2.090736641, -8.290435471))
            ThreePointArc((2.090736641, -8.290435471), (1.840738409, -8.289023721), (1.622673976, -8.166757568))
            ThreePointArc((1.622673976, -8.166757568), (1.726191515, -8.261339585), (1.834015536, -8.350981201))
        make_face()
        with BuildLine():
            ThreePointArc((6.315154098, -5.763794646), (6.291434191, -5.625595497), (6.261282532, -5.48865567))
            ThreePointArc((6.261282532, -5.48865567), (6.258135911, -5.738638085), (6.134359406, -5.955848779))
            ThreePointArc((6.134359406, -5.955848779), (6.225497395, -5.860518934), (6.315154098, -5.763794646))
        make_face()
        with BuildLine():
            ThreePointArc((5.763794646, -6.315154098), (5.860518934, -6.225497395), (5.955848779, -6.134359406))
            ThreePointArc((5.955848779, -6.134359406), (5.738638085, -6.258135911), (5.48865567, -6.261282532))
            ThreePointArc((5.48865567, -6.261282532), (5.625595497, -6.291434191), (5.763794646, -6.315154098))
        make_face()
        with BuildLine():
            ThreePointArc((8.350981201, -1.834015536), (8.261339585, -1.726191515), (8.166757568, -1.622673976))
            ThreePointArc((8.166757568, -1.622673976), (8.289023721, -1.840738409), (8.290435471, -2.090736641))
            ThreePointArc((8.290435471, -2.090736641), (8.321698363, -1.962609579), (8.350981201, -1.834015536))
        make_face()
        with BuildLine():
            ThreePointArc((8.149169634, -2.587186555), (8.188106974, -2.461179428), (8.225096047, -2.334586692))
            ThreePointArc((8.225096047, -2.334586692), (8.09887432, -2.550385637), (7.883956508, -2.678101898))
            ThreePointArc((7.883956508, -2.678101898), (8.017625707, -2.635744088), (8.149169634, -2.587186555))
        make_face()
        with BuildLine():
            ThreePointArc((8.149169634, 2.587186555), (8.017625707, 2.635744088), (7.883956508, 2.678101898))
            ThreePointArc((7.883956508, 2.678101898), (8.09887432, 2.550385637), (8.225096047, 2.334586692))
            ThreePointArc((8.225096047, 2.334586692), (8.188106974, 2.461179428), (8.149169634, 2.587186555))
        make_face()
        with BuildLine():
            ThreePointArc((8.350981201, 1.834015536), (8.321698363, 1.962609579), (8.290435471, 2.090736641))
            ThreePointArc((8.290435471, 2.090736641), (8.289023721, 1.840738409), (8.166757568, 1.622673976))
            ThreePointArc((8.166757568, 1.622673976), (8.261339585, 1.726191515), (8.350981201, 1.834015536))
        make_face()
    extrude(amount=PATTERN_CIRCULAR_4_DEPTH, mode=Mode.SUBTRACT)


solid = part.part
